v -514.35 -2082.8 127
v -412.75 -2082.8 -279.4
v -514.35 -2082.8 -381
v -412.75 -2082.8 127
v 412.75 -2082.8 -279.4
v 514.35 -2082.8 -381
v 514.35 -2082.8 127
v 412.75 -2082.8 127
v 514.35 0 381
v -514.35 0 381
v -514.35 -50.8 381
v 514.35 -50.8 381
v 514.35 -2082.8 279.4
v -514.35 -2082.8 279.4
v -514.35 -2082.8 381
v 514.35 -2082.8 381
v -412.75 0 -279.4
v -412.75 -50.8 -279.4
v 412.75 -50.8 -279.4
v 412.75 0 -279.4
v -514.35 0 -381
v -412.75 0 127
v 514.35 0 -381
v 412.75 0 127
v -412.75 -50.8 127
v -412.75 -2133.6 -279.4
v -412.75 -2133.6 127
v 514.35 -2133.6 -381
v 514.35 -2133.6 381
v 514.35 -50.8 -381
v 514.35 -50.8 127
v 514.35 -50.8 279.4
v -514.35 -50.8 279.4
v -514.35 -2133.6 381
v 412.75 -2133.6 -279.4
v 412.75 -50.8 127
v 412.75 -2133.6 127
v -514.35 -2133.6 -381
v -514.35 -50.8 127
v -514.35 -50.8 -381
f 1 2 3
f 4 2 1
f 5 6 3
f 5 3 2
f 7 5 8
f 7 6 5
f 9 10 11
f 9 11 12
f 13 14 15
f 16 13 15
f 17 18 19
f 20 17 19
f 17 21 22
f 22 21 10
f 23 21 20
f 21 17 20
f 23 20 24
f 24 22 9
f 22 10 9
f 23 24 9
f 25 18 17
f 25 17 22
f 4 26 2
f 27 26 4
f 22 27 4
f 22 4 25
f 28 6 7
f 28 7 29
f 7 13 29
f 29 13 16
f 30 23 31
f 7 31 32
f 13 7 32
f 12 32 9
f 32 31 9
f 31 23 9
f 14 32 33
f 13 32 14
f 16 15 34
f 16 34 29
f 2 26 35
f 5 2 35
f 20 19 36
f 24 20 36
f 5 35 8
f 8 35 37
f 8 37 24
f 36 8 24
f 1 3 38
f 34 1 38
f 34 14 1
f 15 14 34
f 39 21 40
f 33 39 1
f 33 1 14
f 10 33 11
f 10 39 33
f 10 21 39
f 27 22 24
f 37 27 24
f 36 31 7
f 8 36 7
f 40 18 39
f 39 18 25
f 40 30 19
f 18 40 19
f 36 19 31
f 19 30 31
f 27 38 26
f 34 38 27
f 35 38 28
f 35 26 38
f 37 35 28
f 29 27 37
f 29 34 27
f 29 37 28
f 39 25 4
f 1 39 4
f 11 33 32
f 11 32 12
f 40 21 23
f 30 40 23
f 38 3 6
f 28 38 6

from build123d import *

# Parameters (mm, degrees)
SKETCH_W        = 1028.7
SKETCH_H        = 762
PAD_DEPTH       = 2133.6
SKETCH001_W     = 825.5
SKETCH001_H     = 406.4
POCKET_DEPTH    = 2133.601
SKETCH002_W     = 507.999996
SKETCH002_H     = 2032
POCKET001_DEPTH = 1028.701
SKETCH003_W     = 101.600004
SKETCH003_H     = 2032
POCKET002_DEPTH = 1028.701


with BuildPart() as part:
    # Sketch → Pad (new body)
    with BuildSketch(Plane.XZ):
        Rectangle(SKETCH_W, SKETCH_H)
    extrude(amount=PAD_DEPTH)

    # Sketch001 → Pocket (cut, through all)
    with BuildSketch(Plane(origin=(0, -2133.6, 0), x_dir=(1, 0, 0), z_dir=(0, -1, 0))):
        with Locations((0, -76.2)):
            Rectangle(SKETCH001_W, SKETCH001_H)
    extrude(amount=-POCKET_DEPTH, mode=Mode.SUBTRACT)

    # Sketch002 → Pocket001 (cut, through all)
    with BuildSketch(Plane(origin=(514.35, 0, 0), x_dir=(0, 0, 1), z_dir=(1, 0, 0))):
        with Locations((-127.000002, 1066.8)):
            Rectangle(SKETCH002_W, SKETCH002_H)
    extrude(amount=-POCKET001_DEPTH, mode=Mode.SUBTRACT)

    # Sketch003 → Pocket002 (cut, through all)
    with BuildSketch(Plane(origin=(514.35, 0, 0), x_dir=(0, 0, 1), z_dir=(1, 0, 0))):
        with Locations((330.199998, 1066.8)):
            Rectangle(SKETCH003_W, SKETCH003_H)
    extrude(amount=-POCKET002_DEPTH, mode=Mode.SUBTRACT)


solid = part.part
